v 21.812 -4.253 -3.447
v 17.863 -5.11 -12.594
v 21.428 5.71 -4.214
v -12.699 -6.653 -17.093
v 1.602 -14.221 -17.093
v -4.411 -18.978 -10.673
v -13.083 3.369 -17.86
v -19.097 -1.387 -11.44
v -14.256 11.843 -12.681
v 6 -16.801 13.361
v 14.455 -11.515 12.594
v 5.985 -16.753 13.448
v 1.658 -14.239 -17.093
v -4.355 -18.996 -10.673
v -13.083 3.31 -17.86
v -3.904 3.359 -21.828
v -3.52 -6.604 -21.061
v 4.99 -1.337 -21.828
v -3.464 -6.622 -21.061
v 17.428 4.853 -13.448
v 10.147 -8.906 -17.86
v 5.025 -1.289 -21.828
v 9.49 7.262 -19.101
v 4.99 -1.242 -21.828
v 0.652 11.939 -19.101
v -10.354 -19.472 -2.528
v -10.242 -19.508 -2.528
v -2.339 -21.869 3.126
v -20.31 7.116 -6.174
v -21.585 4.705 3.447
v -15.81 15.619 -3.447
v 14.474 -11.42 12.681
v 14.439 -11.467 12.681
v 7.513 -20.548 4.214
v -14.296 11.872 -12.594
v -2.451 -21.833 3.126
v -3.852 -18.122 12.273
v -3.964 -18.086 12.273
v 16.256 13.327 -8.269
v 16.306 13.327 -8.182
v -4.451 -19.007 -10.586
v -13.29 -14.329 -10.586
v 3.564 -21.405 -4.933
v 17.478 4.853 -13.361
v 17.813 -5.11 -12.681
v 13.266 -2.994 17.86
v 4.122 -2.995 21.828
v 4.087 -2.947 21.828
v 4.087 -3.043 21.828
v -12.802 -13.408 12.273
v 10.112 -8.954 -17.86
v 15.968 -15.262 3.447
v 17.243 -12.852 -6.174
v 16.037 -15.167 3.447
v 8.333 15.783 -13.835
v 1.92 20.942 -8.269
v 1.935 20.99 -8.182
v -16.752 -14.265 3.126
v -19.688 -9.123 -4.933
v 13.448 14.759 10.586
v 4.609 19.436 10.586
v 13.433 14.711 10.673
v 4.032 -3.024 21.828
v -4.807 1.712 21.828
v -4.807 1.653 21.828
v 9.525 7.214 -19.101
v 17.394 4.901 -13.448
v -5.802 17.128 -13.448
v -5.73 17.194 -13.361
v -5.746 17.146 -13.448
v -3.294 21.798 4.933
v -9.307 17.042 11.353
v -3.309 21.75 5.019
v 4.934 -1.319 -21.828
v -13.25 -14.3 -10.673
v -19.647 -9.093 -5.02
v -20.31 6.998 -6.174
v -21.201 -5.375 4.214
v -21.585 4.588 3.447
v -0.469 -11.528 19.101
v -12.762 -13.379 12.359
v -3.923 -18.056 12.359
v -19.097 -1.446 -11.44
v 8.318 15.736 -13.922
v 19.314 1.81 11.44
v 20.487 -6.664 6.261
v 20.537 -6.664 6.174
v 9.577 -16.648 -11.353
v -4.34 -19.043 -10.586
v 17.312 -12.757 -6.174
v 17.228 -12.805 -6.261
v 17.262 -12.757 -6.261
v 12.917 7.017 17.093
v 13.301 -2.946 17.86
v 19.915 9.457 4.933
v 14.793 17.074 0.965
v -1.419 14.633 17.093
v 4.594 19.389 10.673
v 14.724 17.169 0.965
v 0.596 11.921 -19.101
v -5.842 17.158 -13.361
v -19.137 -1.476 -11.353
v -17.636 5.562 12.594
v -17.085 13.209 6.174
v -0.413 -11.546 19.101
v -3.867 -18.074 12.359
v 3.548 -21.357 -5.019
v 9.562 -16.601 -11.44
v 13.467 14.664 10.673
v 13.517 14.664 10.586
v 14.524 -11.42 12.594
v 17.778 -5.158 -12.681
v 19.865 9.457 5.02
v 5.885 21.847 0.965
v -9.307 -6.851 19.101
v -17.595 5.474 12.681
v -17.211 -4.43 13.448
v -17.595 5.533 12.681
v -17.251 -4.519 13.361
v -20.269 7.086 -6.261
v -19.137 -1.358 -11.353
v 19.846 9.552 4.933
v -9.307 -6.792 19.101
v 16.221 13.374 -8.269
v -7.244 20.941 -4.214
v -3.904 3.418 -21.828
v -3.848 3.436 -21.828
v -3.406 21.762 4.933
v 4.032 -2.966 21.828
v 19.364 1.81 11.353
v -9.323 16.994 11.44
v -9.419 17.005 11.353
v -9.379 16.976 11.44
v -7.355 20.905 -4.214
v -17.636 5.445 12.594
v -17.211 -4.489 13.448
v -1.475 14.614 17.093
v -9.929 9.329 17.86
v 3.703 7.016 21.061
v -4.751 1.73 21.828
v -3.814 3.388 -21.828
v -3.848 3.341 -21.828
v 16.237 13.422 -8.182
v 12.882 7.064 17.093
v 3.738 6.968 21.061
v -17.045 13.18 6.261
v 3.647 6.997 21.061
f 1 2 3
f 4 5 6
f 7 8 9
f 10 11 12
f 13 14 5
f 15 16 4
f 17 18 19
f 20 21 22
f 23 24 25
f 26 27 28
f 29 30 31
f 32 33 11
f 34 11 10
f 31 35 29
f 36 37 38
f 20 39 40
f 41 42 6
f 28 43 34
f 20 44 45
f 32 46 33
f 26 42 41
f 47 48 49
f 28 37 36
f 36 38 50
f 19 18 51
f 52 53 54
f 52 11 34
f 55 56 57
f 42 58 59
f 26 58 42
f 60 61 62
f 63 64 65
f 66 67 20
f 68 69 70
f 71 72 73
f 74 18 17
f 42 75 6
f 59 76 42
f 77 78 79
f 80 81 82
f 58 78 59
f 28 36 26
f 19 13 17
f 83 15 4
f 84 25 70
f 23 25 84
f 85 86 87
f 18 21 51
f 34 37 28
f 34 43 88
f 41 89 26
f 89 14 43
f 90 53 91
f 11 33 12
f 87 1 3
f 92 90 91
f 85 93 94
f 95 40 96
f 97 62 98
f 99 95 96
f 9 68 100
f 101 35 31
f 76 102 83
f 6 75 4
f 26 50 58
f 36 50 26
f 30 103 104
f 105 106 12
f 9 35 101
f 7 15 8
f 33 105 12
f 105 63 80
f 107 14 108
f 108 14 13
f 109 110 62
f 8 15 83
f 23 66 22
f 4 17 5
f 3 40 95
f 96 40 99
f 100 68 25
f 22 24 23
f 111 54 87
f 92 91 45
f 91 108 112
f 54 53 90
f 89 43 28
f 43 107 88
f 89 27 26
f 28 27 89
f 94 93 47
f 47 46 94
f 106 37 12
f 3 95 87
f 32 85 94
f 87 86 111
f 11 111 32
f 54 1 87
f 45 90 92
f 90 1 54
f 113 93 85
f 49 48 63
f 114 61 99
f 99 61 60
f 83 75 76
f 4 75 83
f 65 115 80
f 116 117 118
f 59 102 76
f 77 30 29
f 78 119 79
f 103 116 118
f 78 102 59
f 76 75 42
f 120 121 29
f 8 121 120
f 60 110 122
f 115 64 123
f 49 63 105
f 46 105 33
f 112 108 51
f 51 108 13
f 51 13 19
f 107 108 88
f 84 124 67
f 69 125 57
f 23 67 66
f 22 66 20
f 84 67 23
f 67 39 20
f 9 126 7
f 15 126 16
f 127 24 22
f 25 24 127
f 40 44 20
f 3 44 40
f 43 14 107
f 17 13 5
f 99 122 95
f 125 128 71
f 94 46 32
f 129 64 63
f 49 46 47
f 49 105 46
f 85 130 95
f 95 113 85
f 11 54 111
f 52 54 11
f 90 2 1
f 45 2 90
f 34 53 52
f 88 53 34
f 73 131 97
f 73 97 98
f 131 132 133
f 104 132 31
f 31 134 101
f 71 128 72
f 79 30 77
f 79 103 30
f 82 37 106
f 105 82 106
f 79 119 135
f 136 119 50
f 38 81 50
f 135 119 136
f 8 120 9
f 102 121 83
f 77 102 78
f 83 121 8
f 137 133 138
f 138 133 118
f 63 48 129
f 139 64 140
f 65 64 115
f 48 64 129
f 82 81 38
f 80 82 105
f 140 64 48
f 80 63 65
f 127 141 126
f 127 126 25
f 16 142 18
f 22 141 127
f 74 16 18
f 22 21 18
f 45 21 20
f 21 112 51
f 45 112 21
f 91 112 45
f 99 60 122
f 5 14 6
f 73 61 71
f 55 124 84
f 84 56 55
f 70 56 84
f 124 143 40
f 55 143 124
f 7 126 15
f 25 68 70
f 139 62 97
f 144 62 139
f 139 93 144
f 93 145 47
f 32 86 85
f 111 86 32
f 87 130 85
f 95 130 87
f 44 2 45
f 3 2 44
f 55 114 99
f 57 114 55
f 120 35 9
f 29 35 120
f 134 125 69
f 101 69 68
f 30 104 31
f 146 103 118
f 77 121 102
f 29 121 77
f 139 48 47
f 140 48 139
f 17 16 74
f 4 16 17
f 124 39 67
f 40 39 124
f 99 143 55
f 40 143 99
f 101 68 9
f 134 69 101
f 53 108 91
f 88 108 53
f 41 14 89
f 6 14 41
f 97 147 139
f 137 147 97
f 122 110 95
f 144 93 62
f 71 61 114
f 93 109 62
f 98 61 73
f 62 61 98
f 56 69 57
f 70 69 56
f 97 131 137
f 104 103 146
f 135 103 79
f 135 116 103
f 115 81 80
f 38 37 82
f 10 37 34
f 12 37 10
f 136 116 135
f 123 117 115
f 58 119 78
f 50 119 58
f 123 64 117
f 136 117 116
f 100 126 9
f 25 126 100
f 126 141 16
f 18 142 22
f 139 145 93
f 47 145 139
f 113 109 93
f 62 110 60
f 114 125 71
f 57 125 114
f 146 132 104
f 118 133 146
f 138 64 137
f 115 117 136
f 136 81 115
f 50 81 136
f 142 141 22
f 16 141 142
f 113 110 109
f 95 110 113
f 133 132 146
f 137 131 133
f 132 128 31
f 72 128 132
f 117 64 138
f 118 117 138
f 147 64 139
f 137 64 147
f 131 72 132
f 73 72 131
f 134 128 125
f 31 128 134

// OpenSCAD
// Auto-generated OpenSCAD file

    inner_points = 10*[[0.3533042389474486, -2.1309567627878985, -0.49328765376831396], [-0.1434686338513388, 1.458507778837387, 1.7006204863472152], [0.9546307475624638, -1.655329376601087, -1.1353040239225165], [0.45785787476367645, 1.9341351650241985, 1.0586041161930126], [-0.43704610665881893, -1.894813525510864, -1.0586041161930126], [-0.9338189794576062, 1.6946510161144215, 1.1353040239225165], [0.1642804019561963, -1.4191861393240526, -1.7006204863472152], [-0.3324924708425911, 2.1702784023012325, 0.49328765376831396], [1.442367608438407, -1.1419910934272737, 1.2594119381637667], [1.3250954410800369, -0.29463345877858294, 1.777323395621165], [2.043694117053422, -0.6663637072404623, 0.6173955680095642], [1.9264219496950519, 0.1809939274082285, 1.1353070254669624], [-1.9056101815901942, -0.14167228789489406, -1.1353070254669624], [-2.022882348948565, 0.7056853467537968, -0.6173955680095642], [-1.3042836729751792, 0.3339550982919174, -1.777323395621165], [-1.4215558403335493, 1.1813127329406081, -1.2594119381637667], [-0.23698424864327555, -2.1774209753120197, 0.31256628980481815], [-0.926685010406531, -0.6821269514814432, 1.9014264532614829], [1.7378471241176563, 0.4853053537177433, -1.3361099908367842], [1.6205749567592862, 1.3326629883664343, -0.818198533379386], [-1.0273345942495429, -1.9412777380349853, -0.25275017261988053], [-1.7170353560127987, -0.44598371420440885, 1.3361099908367842], [0.9474967785113886, 0.7214485909947776, -1.9014264532614829], [0.8302246111530187, 1.5688062256434685, -1.3835149958040847], [-1.272154046123399, -1.3349344510202745, 1.227265112107367], [-0.9888880786112537, 0.9299408496408343, 1.7773209673206987], [1.0096998467161113, -0.8906192101274999, -1.7773209673206987], [0.5854051592791625, 2.1751495126581784, 0.09650028892316316], [1.5936743508035691, -1.5167318536526972, 0.34471218833297446], [1.2866518307249903, 0.7016792344842905, 1.7006219871194381], [-1.2658400626201327, -0.662357594970956, -1.7006219871194381], [-1.5728625826987115, 1.5560534931660317, -0.34471218833297446], [-0.04282195529156968, -1.1498727155477642, 1.901427380789726], [2.1327977912138616, 0.5709633336563915, -0.42140966776201205], [-2.1119860231090044, -0.5316416941430571, 0.42140966776201205], [0.0636337233964272, 1.1891943550610986, -1.901427380789726], [0.7482549060436543, -2.04529878284925, 0.4214126693064581], [0.36875420060323677, 0.6968081241273445, 2.097409351964589], [1.7212216353190553, -1.2757175060187171, -0.6173916389368752], [1.341720929878638, 1.4663894009578775, 1.0586050437212557], [-1.3209091617737803, -1.427067761444543, -1.0586050437212557], [-1.7004098672141976, 1.3150391455320516, 0.6173916389368752], [-0.34794243249837925, -0.65748648461401, -2.097409351964589], [-0.7274431379387967, 2.084620422362584, -0.4214126693064581], [0.5969481636784919, -1.6705580226238264, 1.3361124191372504], [0.40719781095828333, -0.29950456913552903, 2.174110760466316], [2.171241401568908, -0.4253493596064819, -0.34470825926028514], [1.9814910488486996, 0.9457040938818155, 0.4932900820687803], [-1.960679280743842, -0.9063824543684811, -0.4932900820687803], [-2.150429633464051, 0.46467099911981635, 0.34470825926028514], [-0.3863860428534258, 0.3388262086488635, -2.174110760466316], [-0.5761363955736345, 1.7098796621371608, -1.3361124191372504], [-0.38829099100843784, -1.8026802150865957, 1.2272660396356103], [-0.47666524415667827, 0.16824119493079182, 2.174109832938073], [1.7762907344727028, -0.51100733954513, -1.2594085823350576], [1.469268214394124, 1.7074037485918578, 0.0965012164514063], [-1.6671047132196049, -1.4205924309589228, 0.31256478903259505], [-1.7554789663678452, 0.5503289790584645, 1.2594085823350576], [0.4974770122615358, -0.12891955541745742, -2.174109832938073], [0.19045449218295696, 2.0894915327195305, -0.818200034151609]];

    outer_points = 10*[[0.3397964015329416, -2.1564818960662593, 0.4692464330642543], [0.1746904120016975, 2.059700581213336, 0.8445026661911221], [0.7406306924188368, -2.059700581213336, -0.44177785220224774], [0.5755247028875927, 2.1564818960662593, -0.0665216190753799], [-0.5755247028875927, -2.1564818960662593, 0.0665216190753799], [-0.7406306924188368, 2.059700581213336, 0.44177785220224774], [-0.1746904120016975, -2.059700581213336, -0.8445026661911221], [-0.3397964015329416, 2.1564818960662593, -0.4692464330642543], [1.7577521828507068, -0.5460434925171852, 1.2642039967754415], [1.7187759458289644, 0.4492621776642618, 1.3527899767738907], [2.158586473736602, -0.4492621776642618, 0.35317971150893934], [2.11961023671486, 0.5460434925171852, 0.44176569150738865], [-2.11961023671486, -0.5460434925171852, -0.44176569150738865], [-2.158586473736602, 0.4492621776642618, -0.35317971150893934], [-1.7187759458289644, -0.4492621776642618, -1.3527899767738907], [-1.7577521828507068, 0.5460434925171852, -1.2642039967754415], [-0.03615139041812482, -1.7979315082680976, 1.3237081800938717], [-0.4108082182533923, 0.29266672075632677, 2.1752357977646932], [1.3261293226739266, -0.29266672075632677, -1.772510983775819], [1.2871530856521844, 0.7026389494251202, -1.6839250037773699], [-0.951472494838659, -1.7979315082680976, 0.9209833661049974], [-1.3261293226739266, 0.29266672075632677, 1.772510983775819], [0.4108082182533923, -0.29266672075632677, -2.1752357977646932], [0.37183198123165007, 0.7026389494251202, -2.086649817766244], [-0.8691142525215587, -0.5733571998568047, 1.9753404554496539], [-0.5952075738469856, 1.673836486075555, 1.3527998149826952], [0.5952075738469856, -1.673836486075555, -1.3527998149826952], [0.45419022354875016, 1.9272132578364132, -1.0322927284215873], [1.706851989845039, -1.3028720368652604, 0.6125754792810341], [1.6048108765685456, 1.3028720368652604, 0.8444965858436926], [-1.6048108765685456, -1.3028720368652604, -0.8444965858436926], [-1.706851989845039, 1.3028720368652604, -0.6125754792810341], [0.4730548368557097, -0.1750790433068909, 2.1752320399033187], [1.9232869251373408, 0.1750790433068909, -1.1208847887674662], [-1.9232869251373408, -0.1750790433068909, 1.1208847887674662], [-0.4730548368557097, 0.1750790433068909, -2.1752320399033187], [0.9369540039963559, -1.6887361320030414, 1.1208726280726071], [0.810824251486854, 1.5321406750951065, 1.4075428812010258], [1.5855175105061965, -1.5321406750951065, -0.3531956300651734], [1.4593877579966947, 1.6887361320030414, -0.06652537693675475], [-1.4593877579966947, -1.6887361320030414, 0.06652537693675475], [-1.5855175105061965, 1.5321406750951065, 0.3531956300651734], [-0.810824251486854, -1.5321406750951065, -1.4075428812010258], [-0.9369540039963559, 1.6887361320030414, -1.1208726280726071], [0.9878541970020238, -0.9319075876549662, 1.7725011455670145], [0.9247893207472729, 0.6785308158941078, 1.9158362721312236], [2.0372519943977596, -0.6785308158941078, -0.6125913978372679], [1.9741871181430086, 0.9319075876549662, -0.4692562712730588], [-1.9741871181430086, -0.9319075876549662, 0.4692562712730588], [-2.0372519943977596, 0.6785308158941078, 0.6125913978372679], [-0.9247893207472729, -0.6785308158941078, -1.9158362721312236], [-0.9878541970020238, 0.9319075876549662, -1.7725011455670145], [0.014748802587543075, -1.0411029639200224, 1.9753366975882793], [0.04092626563817092, 1.1462765799573253, 1.9158400299925986], [1.4400943919343452, -1.1462765799573253, -1.2642175928456207], [1.3380532786578523, 1.4594674937731955, -1.0322964862829624], [-1.4662718549849731, -1.0411029639200224, 1.3237142604413015], [-1.4400943919343452, 1.1462765799573253, 1.2642175928456207], [-0.04092626563817092, -1.1462765799573253, -1.9158400299925986], [-0.14296737891466405, 1.4594674937731955, -1.6839189234299403]];

    // Convex hull for inner set (I)
    module inner_hull() {
        hull() {
            for (p = inner_points) {
                translate(p) sphere(r=0.1);
            }
        }
    }

    // Convex hull for outer set (O) minus inner hull (O \ I)
    module outer_minus_inner() {
        difference() {
            hull() {
                for (p = outer_points) {
                    translate(p) sphere(r=0.1);
                }
            }
            inner_hull(); // Subtract inner hull
        }
    }

    // Convex hull for outer set (O) minus all translated inner hulls
    module outer_minus_AllTranslationInner() {
        difference() {
            hull() {
                for (p = outer_points) {
                    translate(p) sphere(r=0.1);
                }
            }
            hull() {
                translate([0,0,50]) inner_hull();
                translate([0,0,-50]) inner_hull();
            }; // Subtract translated inner hulls
        }
    }

    // Difference between outer_minus_inner and outer_minus_AllTranslationInner
    module outer_minus_inner_diff() {
        difference() {
            // Outer minus inner
            difference() {
                hull() {
                    for (p = outer_points) {
                        translate(p) sphere(r=0.1);
                    }
                }
                inner_hull();
            }

            // Subtract Outer minus AllTranslationInner
            difference() {
                hull() {
                    for (p = outer_points) {
                        translate(p) sphere(r=0.1);
                    }
                }
                hull() {
                    translate([0,0,50]) inner_hull();
                    translate([0,0,-50]) inner_hull();
                };
            }
        }
    }

    // Rendering all with colors applied
    color([1, 0, 0, 0.5]) inner_hull(); // Transparent red
    
